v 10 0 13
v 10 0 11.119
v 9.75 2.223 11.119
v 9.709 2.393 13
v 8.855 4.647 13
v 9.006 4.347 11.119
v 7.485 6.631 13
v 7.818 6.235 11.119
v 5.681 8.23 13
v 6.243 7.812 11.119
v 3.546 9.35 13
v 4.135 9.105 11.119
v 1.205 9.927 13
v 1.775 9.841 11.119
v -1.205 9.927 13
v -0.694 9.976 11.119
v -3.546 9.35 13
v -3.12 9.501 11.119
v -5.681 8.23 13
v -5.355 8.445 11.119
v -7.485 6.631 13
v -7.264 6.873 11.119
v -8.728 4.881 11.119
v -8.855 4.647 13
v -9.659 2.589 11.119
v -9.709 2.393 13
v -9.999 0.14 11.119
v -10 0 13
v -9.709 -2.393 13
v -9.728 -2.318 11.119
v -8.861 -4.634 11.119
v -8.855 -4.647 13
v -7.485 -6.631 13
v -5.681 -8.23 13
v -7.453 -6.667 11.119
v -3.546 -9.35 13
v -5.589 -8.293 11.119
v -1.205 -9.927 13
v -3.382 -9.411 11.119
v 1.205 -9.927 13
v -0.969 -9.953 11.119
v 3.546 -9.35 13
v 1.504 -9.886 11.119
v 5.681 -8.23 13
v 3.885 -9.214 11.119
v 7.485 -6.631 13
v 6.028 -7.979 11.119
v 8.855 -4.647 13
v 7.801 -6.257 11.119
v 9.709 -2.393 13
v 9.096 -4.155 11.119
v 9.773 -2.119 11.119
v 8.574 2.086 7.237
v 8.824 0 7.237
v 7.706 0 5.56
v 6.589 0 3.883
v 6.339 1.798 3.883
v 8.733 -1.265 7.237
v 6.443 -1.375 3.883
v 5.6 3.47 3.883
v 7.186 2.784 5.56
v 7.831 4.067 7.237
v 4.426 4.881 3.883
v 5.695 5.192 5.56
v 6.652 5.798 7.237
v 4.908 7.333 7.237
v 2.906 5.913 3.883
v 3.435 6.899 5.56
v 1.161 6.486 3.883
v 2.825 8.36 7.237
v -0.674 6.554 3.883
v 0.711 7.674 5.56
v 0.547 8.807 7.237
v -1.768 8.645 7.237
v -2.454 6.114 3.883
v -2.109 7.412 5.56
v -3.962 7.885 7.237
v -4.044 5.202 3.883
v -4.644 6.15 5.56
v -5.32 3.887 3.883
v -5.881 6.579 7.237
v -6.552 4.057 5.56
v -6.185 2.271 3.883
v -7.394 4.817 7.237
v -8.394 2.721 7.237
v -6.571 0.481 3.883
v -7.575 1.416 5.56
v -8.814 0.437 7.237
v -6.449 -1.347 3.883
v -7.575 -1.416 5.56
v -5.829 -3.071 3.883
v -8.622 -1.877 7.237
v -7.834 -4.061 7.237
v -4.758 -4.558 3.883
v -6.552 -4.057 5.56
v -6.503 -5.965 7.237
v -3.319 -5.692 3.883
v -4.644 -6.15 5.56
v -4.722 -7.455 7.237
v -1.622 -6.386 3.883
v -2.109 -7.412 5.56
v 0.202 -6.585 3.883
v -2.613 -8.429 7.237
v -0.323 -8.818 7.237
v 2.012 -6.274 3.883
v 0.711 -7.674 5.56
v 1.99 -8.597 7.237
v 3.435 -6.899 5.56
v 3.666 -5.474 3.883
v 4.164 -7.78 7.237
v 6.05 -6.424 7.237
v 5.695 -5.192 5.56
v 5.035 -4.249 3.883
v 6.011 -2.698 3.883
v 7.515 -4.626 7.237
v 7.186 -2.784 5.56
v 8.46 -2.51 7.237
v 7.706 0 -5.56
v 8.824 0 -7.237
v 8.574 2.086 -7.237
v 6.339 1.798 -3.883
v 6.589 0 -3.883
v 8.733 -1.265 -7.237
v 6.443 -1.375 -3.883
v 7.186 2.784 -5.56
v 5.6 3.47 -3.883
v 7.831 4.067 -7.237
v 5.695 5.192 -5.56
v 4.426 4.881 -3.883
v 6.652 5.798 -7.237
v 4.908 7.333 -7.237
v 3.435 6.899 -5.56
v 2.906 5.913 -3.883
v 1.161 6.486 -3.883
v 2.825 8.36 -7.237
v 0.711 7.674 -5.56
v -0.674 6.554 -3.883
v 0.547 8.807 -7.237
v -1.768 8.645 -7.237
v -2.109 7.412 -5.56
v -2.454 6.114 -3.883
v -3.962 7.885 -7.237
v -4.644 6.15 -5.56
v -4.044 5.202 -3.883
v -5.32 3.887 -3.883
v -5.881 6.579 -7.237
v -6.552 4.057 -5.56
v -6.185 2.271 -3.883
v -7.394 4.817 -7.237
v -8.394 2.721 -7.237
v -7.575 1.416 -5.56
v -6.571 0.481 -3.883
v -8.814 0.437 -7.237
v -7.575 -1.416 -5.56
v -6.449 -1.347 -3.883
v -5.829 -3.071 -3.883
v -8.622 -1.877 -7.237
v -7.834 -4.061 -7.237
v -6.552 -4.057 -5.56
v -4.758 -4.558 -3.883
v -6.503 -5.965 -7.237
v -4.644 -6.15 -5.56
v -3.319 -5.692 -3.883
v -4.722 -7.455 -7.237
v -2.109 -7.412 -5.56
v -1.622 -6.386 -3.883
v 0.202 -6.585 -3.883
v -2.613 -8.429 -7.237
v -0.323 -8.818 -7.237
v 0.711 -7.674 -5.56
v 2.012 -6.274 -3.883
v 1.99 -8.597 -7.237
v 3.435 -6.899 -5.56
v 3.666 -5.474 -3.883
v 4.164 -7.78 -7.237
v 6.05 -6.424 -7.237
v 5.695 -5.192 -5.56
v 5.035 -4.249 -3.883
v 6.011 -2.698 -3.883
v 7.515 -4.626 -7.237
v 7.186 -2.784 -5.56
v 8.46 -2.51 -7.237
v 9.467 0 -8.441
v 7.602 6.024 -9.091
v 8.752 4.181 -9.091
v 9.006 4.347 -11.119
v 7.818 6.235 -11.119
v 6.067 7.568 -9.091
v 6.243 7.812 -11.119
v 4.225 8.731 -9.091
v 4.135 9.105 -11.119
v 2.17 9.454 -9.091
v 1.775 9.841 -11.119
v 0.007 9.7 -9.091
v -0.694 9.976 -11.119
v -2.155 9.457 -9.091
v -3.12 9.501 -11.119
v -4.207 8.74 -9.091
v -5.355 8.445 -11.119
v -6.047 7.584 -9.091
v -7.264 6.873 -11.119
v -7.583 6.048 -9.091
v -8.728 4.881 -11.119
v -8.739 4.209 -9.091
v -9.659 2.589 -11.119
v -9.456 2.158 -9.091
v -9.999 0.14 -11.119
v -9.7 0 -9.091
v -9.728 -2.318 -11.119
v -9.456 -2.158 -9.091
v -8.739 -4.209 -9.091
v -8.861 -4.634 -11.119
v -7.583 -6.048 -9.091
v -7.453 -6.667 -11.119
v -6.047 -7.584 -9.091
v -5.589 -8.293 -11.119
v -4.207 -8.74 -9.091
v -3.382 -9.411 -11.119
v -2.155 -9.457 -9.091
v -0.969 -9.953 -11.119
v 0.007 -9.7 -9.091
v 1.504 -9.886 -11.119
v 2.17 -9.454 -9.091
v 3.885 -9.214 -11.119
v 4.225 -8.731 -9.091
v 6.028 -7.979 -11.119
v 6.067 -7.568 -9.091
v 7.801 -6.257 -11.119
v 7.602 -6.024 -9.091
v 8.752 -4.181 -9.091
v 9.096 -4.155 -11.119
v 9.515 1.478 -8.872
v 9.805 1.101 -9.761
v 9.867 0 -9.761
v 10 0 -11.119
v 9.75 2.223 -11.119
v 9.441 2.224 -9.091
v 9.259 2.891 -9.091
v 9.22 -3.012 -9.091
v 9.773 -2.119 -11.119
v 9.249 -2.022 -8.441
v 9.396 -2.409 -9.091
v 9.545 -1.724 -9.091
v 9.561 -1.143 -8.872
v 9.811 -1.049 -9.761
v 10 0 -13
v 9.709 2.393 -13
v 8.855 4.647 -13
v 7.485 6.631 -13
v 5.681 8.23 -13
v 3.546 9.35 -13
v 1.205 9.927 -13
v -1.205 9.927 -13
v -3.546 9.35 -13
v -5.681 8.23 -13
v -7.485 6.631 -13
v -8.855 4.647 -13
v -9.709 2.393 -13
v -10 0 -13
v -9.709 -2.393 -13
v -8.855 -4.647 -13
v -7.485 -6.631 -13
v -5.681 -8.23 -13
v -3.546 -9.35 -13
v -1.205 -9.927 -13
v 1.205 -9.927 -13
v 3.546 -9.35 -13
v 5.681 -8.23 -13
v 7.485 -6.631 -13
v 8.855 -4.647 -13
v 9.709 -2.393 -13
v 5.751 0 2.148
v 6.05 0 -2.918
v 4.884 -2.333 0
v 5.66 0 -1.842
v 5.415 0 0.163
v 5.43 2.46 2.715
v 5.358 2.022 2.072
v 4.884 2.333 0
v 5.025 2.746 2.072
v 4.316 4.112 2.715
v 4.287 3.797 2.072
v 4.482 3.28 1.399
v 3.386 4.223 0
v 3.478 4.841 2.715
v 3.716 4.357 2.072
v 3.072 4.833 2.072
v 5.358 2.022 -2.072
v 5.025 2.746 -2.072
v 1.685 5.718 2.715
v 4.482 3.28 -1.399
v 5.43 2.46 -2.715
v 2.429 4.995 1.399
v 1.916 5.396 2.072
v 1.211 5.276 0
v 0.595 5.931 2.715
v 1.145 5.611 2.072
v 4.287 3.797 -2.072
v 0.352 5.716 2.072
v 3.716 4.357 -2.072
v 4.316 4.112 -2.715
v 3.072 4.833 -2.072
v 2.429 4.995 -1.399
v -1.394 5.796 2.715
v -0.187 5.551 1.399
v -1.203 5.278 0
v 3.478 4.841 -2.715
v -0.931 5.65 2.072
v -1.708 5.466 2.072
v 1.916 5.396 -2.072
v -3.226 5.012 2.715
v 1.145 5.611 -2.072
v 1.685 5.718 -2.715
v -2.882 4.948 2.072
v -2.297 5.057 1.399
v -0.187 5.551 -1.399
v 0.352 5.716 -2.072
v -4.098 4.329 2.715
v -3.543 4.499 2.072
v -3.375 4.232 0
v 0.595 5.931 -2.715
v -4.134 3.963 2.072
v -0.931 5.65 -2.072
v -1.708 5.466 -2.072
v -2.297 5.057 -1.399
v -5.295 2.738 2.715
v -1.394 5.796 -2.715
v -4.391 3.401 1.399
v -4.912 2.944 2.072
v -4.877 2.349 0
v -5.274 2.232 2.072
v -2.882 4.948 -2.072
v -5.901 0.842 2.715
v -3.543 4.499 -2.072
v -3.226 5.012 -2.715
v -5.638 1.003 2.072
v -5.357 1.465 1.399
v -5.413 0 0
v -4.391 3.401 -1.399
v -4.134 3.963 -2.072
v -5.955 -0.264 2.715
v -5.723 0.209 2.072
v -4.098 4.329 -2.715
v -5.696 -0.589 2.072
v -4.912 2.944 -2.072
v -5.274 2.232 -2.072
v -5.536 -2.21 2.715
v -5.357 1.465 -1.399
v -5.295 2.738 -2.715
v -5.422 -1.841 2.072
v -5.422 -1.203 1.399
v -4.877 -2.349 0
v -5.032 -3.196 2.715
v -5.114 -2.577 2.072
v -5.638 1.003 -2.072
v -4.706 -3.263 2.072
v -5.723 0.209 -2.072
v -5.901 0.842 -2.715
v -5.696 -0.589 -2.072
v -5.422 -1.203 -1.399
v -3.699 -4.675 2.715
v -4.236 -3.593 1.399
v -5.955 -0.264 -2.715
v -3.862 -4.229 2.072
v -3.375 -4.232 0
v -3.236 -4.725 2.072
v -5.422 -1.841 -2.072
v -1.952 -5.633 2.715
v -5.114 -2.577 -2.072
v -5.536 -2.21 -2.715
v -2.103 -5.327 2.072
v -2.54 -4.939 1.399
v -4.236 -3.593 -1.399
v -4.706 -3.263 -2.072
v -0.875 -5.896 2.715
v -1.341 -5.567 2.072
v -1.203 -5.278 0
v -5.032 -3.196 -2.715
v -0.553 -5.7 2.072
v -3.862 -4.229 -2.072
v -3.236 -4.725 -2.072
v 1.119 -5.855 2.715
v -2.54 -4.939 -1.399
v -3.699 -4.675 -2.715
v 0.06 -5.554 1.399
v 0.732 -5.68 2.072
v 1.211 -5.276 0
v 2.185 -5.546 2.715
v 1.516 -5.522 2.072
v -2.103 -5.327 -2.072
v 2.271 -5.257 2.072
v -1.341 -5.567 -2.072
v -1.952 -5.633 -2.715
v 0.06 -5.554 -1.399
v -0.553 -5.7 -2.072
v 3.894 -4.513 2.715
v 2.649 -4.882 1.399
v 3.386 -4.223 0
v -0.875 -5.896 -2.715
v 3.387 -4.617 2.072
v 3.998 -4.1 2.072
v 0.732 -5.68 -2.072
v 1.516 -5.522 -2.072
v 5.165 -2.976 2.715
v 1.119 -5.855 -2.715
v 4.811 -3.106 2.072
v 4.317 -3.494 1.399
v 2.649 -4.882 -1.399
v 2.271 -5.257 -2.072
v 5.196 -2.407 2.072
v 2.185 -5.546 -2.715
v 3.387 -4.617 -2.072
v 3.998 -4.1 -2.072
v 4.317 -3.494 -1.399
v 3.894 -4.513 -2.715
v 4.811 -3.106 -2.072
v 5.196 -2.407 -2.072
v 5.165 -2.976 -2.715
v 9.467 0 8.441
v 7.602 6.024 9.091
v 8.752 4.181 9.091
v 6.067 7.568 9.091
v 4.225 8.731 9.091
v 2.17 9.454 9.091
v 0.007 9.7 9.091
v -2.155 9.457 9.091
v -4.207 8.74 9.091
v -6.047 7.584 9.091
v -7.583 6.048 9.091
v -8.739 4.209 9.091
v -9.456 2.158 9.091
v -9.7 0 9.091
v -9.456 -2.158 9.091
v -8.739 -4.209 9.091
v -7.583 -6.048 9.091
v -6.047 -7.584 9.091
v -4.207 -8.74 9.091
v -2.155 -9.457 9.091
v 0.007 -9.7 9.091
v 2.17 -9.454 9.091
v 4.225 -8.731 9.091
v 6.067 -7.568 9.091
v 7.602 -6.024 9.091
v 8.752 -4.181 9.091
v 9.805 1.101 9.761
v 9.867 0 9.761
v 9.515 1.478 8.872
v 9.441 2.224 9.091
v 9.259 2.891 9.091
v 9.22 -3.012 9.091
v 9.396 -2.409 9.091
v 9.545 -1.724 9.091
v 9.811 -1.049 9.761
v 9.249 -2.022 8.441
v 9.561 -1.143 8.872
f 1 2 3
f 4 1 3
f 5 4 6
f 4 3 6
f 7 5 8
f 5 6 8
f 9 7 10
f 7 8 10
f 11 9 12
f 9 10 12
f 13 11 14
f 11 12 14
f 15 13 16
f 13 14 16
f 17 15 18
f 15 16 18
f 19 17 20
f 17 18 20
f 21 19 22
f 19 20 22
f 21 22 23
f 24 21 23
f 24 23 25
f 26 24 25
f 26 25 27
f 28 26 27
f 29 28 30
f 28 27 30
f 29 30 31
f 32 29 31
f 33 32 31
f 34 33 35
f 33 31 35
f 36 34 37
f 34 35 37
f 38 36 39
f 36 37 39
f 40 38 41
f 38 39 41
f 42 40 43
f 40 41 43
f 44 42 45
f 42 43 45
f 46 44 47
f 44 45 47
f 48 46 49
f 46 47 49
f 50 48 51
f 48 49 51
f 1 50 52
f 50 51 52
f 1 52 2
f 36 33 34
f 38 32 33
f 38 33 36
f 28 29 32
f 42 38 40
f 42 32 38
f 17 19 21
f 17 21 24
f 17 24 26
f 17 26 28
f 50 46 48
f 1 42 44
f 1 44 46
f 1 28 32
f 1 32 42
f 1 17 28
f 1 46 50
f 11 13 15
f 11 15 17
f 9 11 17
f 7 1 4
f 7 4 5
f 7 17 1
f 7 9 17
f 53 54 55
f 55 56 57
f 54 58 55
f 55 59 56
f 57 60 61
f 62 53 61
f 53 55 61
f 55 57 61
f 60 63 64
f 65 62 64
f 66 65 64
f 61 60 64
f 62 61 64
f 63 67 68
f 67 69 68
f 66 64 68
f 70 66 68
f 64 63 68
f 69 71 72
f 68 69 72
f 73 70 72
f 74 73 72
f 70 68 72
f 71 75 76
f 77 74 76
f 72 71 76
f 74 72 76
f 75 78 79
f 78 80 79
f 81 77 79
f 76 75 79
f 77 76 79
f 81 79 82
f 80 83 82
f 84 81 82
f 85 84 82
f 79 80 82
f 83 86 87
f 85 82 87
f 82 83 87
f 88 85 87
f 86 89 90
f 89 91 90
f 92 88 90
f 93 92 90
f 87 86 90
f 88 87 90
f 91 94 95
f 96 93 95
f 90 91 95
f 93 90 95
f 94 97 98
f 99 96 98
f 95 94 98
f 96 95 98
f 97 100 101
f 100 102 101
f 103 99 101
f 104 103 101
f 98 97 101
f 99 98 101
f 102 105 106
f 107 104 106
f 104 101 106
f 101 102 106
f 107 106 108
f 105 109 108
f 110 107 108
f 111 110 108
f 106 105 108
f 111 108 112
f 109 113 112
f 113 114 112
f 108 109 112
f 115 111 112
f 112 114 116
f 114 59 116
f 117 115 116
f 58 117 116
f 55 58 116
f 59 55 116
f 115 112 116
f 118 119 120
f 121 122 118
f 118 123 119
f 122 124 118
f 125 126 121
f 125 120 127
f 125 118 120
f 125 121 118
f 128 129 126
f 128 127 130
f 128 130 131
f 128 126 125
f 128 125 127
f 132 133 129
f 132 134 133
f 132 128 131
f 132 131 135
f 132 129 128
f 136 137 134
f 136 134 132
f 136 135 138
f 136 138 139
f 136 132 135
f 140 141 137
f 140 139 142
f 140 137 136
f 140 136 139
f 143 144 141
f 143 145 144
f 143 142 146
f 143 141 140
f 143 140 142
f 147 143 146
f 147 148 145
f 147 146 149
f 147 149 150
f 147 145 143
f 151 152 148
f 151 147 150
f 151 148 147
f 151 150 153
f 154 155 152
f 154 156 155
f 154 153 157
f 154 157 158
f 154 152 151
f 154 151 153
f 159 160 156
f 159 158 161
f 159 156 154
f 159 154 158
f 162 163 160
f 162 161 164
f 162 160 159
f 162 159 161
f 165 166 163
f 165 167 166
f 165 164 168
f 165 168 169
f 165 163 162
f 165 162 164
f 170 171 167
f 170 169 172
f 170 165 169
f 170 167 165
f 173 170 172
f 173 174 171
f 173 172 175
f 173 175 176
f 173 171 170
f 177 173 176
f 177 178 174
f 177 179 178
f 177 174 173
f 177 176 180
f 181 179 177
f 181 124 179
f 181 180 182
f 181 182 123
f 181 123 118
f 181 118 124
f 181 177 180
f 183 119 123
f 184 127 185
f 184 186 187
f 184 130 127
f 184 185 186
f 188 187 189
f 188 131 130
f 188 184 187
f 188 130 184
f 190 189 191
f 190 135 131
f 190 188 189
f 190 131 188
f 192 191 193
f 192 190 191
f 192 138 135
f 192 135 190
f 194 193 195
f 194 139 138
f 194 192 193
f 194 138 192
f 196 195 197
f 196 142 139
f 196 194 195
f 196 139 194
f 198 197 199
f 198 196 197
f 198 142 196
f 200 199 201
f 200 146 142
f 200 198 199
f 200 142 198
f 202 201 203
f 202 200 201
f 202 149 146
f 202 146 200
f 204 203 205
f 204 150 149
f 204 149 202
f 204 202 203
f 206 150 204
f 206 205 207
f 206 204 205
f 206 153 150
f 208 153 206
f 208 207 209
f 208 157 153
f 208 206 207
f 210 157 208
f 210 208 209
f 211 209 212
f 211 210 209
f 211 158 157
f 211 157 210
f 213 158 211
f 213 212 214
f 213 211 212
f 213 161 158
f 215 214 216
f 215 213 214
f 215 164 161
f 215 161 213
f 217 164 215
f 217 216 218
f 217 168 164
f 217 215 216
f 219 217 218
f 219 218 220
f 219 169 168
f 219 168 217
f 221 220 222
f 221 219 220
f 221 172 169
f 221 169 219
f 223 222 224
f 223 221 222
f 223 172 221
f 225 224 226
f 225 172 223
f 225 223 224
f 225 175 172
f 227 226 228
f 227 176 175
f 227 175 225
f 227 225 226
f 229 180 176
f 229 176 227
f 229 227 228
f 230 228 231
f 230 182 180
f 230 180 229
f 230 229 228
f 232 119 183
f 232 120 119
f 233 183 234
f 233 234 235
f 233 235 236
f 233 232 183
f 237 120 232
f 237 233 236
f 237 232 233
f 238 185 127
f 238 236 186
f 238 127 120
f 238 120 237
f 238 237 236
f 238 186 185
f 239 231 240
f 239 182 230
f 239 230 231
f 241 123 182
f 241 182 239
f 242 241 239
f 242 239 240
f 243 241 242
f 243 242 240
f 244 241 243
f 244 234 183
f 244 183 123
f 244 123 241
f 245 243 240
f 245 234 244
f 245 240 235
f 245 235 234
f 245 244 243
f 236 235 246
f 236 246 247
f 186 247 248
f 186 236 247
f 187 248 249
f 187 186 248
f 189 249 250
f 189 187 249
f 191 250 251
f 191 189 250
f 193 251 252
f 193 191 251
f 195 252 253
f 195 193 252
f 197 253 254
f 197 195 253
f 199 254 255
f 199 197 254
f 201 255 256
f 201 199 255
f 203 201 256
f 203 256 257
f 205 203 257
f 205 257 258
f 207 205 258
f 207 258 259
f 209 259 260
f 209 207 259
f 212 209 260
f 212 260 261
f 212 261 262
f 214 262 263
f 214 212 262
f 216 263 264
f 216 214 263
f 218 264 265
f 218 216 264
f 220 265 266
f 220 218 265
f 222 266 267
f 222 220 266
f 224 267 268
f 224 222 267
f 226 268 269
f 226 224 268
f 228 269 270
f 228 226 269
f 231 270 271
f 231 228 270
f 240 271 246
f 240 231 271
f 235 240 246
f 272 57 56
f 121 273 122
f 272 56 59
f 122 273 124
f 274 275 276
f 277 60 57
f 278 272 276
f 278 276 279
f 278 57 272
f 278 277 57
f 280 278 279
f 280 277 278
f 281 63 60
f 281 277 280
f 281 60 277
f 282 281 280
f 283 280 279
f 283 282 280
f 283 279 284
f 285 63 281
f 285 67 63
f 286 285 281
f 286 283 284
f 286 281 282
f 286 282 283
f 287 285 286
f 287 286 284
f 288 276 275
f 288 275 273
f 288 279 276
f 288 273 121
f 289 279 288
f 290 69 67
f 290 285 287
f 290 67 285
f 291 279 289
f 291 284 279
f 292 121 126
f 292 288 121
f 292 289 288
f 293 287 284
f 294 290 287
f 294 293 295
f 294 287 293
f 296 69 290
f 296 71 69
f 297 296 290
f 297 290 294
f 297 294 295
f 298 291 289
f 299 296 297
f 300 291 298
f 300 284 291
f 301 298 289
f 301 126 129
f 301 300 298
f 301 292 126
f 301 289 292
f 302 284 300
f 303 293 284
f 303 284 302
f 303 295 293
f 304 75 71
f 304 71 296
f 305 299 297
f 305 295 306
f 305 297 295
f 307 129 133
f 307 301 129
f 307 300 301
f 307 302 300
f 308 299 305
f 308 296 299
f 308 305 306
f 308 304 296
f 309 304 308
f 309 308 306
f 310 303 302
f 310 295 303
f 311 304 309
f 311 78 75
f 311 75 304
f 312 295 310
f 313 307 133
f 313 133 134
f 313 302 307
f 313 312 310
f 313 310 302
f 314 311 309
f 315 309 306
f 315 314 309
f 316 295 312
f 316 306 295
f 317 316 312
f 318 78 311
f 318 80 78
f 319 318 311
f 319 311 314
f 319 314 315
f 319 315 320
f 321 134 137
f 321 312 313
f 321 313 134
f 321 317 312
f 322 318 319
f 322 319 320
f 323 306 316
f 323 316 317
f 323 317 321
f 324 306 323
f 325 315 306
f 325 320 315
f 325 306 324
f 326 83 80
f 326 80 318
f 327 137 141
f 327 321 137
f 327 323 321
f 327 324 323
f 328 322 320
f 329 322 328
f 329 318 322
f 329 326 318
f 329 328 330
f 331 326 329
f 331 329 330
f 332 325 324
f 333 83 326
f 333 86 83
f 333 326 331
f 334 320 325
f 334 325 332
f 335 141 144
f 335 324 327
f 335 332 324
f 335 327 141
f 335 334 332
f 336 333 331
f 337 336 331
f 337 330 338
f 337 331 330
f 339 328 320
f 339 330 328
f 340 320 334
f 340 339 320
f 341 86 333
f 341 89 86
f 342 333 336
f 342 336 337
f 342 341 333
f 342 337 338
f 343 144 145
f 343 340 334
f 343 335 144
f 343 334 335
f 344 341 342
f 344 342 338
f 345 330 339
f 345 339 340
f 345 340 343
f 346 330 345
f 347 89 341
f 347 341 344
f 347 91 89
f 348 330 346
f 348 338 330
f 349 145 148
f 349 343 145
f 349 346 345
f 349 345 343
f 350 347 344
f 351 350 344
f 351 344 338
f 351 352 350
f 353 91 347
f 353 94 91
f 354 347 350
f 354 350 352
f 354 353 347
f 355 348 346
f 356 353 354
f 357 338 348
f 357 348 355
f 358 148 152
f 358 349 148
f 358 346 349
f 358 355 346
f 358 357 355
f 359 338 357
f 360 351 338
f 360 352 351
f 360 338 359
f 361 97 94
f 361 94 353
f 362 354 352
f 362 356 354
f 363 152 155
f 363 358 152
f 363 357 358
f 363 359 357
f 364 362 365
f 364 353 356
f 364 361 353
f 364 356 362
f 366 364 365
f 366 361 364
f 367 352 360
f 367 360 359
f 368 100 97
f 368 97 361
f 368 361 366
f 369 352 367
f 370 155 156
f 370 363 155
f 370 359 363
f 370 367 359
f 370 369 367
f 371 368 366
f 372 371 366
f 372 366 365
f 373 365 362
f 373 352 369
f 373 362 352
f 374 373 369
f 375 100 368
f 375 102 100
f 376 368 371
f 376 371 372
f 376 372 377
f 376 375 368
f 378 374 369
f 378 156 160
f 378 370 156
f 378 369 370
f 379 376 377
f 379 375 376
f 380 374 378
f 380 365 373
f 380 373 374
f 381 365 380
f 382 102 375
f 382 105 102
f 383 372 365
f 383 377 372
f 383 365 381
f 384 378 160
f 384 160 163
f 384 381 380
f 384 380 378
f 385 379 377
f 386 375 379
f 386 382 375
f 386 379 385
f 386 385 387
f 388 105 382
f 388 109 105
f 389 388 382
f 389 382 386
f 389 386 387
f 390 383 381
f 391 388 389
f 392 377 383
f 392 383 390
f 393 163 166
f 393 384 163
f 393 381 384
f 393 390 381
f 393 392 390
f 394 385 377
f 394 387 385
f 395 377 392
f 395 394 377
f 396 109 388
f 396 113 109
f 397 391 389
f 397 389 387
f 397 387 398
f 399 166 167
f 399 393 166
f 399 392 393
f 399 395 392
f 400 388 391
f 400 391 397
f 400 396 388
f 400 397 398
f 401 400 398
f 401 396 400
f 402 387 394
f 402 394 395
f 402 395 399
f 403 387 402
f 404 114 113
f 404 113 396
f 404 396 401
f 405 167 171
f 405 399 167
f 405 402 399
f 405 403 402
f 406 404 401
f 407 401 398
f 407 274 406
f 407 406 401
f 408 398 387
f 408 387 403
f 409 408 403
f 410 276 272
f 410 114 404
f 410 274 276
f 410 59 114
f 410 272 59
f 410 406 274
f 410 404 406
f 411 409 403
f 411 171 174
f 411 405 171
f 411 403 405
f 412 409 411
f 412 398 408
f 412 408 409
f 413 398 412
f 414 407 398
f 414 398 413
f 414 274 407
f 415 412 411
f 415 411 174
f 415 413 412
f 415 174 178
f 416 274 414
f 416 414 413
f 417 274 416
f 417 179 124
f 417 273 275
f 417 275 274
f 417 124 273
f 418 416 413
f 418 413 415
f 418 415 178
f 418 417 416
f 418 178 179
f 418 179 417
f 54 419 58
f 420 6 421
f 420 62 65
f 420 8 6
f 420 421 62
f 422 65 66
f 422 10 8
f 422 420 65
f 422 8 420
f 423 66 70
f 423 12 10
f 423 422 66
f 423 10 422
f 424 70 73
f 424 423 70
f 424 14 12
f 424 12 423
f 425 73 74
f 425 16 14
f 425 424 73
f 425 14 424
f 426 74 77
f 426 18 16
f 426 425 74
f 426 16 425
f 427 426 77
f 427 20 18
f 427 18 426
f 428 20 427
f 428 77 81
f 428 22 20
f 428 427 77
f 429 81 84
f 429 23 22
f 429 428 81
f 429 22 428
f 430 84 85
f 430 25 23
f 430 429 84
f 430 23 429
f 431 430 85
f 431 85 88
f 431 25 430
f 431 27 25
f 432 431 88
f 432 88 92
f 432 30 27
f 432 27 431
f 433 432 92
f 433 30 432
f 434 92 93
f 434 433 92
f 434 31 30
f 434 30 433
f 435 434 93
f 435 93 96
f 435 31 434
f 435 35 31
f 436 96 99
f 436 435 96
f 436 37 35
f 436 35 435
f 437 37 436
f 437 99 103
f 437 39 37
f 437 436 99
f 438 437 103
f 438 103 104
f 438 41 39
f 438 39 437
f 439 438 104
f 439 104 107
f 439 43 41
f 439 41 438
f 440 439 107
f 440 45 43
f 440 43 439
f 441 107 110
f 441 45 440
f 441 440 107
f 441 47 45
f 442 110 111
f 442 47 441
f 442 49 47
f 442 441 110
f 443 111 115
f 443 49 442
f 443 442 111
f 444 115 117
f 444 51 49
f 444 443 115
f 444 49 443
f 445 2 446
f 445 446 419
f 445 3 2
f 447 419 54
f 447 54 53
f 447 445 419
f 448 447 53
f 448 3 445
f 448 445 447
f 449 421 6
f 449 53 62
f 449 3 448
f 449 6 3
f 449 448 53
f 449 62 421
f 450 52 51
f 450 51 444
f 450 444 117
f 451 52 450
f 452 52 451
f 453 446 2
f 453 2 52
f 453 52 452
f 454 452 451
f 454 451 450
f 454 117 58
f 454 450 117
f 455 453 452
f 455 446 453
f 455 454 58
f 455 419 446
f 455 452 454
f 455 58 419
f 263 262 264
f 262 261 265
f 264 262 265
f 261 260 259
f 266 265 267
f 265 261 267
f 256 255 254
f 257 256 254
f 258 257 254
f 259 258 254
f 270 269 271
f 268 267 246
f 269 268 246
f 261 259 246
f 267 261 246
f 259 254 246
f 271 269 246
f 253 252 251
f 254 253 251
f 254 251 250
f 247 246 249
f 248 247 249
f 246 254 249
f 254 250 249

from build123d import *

# Parameters (mm, degrees)
F1_R     = 10
F2_R     = 4
F5_DEPTH = 4
F6_DEPTH = 4
F7_R     = 7


with BuildPart() as f3:
    # F1 (on offset) → F3 section 0
    with BuildSketch(Plane.XY.offset(9)):
        Circle(F1_R)
    # F2 (on Top) → F3 section 1
    with BuildSketch(Plane.XY):
        Circle(F2_R)
    loft()

    # F4: F3 across plane


with BuildPart() as f3_1:
    add(f3.part)
    add(f3.part.mirror(Plane.XY))

    # F5 (add): a face of the model
    f5_faces = [f3_1.faces().sort_by_distance(p)[0] for p in [
        (0, 0, -9),
    ]]
    extrude(f5_faces, amount=F5_DEPTH)

    # F6 (add): a face of the model
    f6_faces = [f3_1.faces().sort_by_distance(p)[0] for p in [
        (0, 0, 9),
    ]]
    extrude(f6_faces, amount=F6_DEPTH)

    # F7
    f7_edges = [f3_1.edges().sort_by_distance(p)[0] for p in [
        (-4, 0, 0),
        (-10, 0, -9),
        (-10, 0, 9),
    ]]
    fillet(f7_edges, radius=F7_R)


solid = f3_1.part
